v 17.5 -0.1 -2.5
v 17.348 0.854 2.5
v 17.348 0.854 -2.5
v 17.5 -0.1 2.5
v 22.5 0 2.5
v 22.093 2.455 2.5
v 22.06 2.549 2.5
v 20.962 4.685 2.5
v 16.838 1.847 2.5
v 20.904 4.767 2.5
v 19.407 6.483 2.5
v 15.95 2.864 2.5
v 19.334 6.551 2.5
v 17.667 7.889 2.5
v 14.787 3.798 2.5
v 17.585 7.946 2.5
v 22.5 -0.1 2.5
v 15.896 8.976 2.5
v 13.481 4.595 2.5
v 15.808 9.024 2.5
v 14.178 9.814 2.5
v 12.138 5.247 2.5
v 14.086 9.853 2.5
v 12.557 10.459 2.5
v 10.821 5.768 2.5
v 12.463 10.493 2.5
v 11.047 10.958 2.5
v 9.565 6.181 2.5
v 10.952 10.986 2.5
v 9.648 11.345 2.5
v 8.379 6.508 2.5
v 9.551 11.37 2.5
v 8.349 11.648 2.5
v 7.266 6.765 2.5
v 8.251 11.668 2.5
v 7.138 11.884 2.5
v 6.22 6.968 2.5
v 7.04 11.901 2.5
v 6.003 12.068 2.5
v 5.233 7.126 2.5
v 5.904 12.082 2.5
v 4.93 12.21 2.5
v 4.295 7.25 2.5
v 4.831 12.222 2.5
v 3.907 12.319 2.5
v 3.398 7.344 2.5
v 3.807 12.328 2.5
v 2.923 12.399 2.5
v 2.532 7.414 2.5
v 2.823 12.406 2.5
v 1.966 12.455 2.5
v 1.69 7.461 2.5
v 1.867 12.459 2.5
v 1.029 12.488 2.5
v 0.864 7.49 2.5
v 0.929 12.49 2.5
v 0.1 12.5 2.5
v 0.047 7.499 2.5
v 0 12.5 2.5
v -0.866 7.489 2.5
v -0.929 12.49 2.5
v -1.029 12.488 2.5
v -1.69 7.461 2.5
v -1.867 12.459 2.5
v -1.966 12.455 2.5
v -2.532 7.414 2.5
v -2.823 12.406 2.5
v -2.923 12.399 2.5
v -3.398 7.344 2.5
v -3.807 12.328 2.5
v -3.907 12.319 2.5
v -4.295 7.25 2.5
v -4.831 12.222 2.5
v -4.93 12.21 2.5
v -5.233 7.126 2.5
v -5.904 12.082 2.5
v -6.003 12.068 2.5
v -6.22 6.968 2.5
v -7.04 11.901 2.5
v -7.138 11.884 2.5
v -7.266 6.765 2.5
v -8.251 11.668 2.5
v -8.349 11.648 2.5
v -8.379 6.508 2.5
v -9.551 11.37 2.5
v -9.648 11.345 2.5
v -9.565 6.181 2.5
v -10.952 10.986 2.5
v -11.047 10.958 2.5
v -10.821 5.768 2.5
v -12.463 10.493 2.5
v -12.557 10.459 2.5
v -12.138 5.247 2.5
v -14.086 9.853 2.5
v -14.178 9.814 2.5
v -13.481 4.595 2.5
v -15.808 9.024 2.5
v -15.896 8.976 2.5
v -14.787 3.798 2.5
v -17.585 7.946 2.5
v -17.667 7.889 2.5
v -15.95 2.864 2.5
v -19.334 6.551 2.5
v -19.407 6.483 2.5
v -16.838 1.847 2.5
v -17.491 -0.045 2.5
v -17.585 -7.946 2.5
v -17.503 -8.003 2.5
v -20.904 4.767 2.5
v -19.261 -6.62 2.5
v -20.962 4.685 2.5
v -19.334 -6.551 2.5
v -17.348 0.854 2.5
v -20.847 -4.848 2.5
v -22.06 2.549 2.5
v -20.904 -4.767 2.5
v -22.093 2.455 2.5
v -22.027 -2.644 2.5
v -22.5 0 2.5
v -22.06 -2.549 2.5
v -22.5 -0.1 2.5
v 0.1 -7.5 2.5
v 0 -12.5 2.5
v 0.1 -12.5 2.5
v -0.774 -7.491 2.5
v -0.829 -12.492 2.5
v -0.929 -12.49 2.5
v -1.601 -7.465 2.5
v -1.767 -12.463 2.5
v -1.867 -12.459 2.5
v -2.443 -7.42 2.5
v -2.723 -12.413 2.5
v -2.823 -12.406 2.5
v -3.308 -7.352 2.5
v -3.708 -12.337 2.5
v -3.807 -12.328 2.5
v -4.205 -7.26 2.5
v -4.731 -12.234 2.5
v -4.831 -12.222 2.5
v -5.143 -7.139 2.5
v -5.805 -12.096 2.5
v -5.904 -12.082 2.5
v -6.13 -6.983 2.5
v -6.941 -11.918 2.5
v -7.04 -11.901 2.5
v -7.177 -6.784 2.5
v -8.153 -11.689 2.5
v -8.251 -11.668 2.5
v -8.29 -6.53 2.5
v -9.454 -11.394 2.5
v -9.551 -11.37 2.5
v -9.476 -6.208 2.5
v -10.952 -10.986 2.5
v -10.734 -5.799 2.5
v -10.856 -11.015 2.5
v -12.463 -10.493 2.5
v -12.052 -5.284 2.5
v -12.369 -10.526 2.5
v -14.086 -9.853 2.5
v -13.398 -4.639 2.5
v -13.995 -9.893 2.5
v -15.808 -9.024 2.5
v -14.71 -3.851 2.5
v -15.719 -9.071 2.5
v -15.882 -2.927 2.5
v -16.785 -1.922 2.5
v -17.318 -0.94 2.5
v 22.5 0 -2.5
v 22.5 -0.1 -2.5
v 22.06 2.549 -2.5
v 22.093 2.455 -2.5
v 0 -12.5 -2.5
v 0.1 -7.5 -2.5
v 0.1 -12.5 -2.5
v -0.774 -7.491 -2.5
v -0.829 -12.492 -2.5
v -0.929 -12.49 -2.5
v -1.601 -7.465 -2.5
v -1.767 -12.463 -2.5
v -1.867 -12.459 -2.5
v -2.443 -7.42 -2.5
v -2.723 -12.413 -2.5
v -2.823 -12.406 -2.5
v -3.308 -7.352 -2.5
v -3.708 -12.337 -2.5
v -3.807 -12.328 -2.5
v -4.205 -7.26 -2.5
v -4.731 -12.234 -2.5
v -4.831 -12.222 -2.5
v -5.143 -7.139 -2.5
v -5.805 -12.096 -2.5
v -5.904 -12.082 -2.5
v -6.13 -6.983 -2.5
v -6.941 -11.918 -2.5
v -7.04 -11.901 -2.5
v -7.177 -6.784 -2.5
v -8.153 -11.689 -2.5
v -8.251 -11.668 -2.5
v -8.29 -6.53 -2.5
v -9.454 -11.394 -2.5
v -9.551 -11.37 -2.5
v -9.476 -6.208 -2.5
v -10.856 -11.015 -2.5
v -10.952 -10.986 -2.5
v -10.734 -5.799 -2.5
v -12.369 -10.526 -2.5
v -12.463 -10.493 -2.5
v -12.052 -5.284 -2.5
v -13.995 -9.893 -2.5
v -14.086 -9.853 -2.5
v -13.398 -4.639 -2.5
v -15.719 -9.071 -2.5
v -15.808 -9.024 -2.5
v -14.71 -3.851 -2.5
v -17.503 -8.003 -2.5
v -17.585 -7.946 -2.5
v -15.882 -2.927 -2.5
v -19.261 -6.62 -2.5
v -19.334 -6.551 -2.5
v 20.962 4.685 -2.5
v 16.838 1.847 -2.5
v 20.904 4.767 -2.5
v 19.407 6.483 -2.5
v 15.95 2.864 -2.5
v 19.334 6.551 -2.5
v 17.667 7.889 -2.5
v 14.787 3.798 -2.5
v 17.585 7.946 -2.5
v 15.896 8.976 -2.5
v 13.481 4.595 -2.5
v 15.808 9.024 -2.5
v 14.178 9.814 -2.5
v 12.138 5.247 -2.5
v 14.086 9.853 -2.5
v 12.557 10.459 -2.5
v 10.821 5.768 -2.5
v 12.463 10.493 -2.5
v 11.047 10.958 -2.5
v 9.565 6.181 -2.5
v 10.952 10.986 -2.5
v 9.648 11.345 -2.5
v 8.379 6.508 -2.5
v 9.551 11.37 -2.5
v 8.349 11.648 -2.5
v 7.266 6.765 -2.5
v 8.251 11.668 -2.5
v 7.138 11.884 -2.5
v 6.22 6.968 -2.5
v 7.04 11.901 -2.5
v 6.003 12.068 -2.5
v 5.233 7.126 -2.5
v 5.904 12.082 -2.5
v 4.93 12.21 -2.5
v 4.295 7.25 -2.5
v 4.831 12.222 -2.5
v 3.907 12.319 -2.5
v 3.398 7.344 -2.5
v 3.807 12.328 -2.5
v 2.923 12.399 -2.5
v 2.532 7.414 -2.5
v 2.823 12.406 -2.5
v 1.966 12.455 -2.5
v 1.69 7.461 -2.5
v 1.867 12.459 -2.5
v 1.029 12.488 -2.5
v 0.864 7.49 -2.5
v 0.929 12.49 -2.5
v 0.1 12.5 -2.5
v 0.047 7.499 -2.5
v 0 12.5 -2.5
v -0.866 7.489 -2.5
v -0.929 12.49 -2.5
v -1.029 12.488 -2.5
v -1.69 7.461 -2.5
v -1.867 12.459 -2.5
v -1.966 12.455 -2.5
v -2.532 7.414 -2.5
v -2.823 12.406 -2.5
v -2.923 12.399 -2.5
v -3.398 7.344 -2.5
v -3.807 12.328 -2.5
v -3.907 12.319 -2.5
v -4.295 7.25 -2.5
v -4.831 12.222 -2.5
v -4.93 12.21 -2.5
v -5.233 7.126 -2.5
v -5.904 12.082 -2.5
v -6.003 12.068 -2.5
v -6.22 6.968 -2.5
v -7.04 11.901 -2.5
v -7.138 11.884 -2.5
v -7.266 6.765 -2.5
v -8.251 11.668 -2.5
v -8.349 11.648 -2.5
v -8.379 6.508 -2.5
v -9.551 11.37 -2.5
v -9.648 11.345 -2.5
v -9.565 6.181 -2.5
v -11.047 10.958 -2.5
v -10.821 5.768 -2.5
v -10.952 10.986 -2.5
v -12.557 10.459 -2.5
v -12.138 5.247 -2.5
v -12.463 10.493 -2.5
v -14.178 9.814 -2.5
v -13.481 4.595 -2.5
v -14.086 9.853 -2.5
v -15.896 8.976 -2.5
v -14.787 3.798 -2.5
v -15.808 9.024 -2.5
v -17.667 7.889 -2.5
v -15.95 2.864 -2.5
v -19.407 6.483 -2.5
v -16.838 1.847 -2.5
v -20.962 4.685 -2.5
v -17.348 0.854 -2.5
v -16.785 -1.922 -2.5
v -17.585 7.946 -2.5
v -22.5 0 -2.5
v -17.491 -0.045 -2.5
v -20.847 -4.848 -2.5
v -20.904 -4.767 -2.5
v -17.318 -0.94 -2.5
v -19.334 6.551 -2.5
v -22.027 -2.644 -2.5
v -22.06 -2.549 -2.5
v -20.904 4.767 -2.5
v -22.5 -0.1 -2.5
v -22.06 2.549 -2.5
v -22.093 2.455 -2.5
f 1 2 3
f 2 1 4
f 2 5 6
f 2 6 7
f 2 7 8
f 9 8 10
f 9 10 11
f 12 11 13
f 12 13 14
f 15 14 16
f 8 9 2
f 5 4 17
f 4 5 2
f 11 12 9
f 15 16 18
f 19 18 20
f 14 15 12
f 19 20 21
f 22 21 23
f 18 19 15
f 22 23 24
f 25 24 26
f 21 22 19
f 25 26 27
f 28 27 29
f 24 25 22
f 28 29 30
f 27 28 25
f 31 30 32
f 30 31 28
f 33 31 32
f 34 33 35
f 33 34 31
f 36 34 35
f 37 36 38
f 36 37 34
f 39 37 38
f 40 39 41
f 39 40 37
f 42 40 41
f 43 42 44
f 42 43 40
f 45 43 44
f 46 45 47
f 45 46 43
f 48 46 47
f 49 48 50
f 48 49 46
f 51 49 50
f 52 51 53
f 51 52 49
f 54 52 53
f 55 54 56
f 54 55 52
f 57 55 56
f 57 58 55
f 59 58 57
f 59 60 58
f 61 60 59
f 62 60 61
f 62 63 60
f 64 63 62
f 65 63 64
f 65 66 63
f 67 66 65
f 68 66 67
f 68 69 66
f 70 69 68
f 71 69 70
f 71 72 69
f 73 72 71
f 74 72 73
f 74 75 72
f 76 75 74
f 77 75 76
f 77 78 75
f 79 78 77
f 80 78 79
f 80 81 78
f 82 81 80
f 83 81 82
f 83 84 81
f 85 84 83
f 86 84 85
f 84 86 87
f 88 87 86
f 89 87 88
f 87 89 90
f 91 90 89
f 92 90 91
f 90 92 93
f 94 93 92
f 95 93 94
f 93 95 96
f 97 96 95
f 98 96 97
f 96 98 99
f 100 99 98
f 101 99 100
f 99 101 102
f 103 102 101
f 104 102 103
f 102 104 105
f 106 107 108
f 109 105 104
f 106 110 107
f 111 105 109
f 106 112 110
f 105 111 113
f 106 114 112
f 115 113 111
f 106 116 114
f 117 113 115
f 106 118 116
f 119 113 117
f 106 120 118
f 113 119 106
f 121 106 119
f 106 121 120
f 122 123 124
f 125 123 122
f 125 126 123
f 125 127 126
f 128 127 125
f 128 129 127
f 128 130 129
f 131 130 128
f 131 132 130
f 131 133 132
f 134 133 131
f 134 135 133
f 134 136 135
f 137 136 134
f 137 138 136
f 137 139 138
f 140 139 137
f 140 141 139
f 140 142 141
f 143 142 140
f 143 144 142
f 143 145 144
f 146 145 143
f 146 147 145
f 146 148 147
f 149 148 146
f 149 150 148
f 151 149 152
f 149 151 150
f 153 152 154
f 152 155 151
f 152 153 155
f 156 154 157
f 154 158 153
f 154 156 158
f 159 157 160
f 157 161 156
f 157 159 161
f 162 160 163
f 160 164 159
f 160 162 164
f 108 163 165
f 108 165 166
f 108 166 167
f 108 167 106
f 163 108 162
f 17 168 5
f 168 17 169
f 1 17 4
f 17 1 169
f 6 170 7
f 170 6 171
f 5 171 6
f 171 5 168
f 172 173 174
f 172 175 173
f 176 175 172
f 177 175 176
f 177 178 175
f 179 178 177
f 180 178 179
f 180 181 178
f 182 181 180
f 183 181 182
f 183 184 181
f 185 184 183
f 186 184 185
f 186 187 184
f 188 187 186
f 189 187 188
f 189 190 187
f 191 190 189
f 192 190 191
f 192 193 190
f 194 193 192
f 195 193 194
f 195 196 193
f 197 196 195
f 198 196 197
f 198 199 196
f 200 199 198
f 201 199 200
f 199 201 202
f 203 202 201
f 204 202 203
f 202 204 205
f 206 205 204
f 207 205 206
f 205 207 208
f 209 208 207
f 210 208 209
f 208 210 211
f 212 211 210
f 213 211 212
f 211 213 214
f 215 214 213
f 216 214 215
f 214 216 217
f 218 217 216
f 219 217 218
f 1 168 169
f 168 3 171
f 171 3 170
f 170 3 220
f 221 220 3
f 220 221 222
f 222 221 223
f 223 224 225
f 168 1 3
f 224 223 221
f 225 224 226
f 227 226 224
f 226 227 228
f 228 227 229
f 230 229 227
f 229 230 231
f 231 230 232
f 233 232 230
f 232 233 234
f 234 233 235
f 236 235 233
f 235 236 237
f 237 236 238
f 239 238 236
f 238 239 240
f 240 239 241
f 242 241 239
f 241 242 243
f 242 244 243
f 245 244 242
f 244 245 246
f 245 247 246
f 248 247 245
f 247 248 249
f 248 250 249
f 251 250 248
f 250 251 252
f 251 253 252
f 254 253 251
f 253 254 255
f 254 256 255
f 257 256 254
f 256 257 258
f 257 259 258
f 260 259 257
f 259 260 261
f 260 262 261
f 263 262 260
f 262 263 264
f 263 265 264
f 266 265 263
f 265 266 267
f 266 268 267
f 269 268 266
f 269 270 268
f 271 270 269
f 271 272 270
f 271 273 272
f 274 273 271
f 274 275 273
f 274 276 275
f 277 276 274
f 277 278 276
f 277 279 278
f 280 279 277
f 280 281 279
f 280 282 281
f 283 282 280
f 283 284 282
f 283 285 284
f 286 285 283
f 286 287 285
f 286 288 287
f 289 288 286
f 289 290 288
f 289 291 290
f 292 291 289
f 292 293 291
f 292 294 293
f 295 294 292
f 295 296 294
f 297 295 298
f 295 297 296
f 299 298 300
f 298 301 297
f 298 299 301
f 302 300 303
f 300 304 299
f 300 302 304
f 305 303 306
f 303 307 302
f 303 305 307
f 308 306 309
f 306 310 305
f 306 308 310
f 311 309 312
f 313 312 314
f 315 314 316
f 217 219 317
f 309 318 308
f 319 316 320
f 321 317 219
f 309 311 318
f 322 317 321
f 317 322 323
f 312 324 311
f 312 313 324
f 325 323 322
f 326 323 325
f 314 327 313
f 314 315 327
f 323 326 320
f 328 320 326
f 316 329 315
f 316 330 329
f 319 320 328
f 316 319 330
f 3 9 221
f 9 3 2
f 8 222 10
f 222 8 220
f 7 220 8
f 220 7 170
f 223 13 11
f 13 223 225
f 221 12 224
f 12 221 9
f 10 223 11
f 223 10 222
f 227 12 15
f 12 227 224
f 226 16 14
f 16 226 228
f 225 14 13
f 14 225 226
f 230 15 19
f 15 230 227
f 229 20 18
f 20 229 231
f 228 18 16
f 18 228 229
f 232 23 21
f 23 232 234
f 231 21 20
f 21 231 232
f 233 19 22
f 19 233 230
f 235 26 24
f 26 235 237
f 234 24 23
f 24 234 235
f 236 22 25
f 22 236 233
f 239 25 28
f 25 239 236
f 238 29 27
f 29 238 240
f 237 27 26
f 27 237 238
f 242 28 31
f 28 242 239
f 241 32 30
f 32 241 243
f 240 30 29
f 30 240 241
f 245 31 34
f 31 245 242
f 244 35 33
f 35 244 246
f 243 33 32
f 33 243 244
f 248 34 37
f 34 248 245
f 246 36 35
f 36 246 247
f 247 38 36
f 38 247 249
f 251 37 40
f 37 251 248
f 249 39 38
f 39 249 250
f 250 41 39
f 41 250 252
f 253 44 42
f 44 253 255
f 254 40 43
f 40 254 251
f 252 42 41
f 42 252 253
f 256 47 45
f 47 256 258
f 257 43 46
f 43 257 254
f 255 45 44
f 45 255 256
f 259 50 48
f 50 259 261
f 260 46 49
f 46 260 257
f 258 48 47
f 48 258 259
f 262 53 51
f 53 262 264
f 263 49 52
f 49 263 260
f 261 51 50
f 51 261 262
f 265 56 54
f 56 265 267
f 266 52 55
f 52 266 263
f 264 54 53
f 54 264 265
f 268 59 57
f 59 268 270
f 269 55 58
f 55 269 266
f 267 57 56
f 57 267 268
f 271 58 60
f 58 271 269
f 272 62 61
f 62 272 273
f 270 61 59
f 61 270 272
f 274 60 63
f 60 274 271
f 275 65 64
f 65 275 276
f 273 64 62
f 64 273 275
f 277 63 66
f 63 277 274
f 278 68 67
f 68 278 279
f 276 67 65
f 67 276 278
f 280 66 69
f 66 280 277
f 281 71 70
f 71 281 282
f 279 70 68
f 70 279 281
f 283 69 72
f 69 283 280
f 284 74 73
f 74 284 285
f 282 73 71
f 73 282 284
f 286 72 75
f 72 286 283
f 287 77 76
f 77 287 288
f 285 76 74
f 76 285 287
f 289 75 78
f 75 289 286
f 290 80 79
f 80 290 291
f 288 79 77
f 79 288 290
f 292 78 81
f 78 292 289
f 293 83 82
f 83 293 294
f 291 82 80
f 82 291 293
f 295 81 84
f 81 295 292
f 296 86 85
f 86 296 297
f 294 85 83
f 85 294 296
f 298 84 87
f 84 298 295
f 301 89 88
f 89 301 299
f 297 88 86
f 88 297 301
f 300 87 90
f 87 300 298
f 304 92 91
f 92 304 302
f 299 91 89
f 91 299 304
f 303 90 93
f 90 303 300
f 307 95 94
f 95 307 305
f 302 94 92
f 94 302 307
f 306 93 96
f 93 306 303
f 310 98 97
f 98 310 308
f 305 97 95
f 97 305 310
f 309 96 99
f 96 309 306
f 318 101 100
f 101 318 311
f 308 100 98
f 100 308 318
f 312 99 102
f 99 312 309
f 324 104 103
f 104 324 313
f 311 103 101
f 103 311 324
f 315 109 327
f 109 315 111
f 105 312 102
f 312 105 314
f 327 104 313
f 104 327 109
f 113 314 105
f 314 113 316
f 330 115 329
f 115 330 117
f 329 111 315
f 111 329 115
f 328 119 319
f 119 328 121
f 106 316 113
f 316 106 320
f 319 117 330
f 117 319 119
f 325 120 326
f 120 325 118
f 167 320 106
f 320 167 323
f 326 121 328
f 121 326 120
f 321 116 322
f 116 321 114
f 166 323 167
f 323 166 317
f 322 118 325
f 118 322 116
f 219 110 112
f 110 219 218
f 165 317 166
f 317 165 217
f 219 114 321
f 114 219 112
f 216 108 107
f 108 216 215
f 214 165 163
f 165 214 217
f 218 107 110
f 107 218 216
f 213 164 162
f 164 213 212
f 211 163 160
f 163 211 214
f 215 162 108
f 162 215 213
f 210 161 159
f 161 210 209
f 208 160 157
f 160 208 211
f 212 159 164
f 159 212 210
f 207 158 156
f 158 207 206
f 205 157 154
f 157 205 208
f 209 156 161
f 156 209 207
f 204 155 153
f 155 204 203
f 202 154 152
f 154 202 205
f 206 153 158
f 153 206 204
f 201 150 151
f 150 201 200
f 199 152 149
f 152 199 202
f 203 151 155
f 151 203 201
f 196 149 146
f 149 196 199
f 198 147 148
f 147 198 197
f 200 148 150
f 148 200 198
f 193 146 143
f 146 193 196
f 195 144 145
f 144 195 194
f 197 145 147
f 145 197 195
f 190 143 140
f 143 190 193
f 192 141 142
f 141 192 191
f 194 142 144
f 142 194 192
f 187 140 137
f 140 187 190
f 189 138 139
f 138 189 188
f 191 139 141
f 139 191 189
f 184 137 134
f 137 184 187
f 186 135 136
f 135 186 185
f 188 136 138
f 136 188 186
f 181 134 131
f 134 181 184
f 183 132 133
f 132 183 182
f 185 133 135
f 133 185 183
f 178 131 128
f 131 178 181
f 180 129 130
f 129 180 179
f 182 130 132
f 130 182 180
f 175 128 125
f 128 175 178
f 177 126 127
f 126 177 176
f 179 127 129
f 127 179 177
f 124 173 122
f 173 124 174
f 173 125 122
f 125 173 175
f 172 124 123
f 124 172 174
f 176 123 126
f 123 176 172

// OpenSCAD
/*
 *
 *  The form to be extruded needs to be centered!
 *
 */
module elliptic_extrude(a, b, angle = 360, step = 1) {
    f = a ^ 2 / b ^ 2;
    function r(phi) = sqrt(a ^ 2 * b ^ 2 / (b ^ 2 * cos(phi) ^ 2 + a ^ 2 * sin(phi) ^ 2));
    function k(x, y) = a ^ 2 / b ^ 2 * y / x;
    function x(phi) = r(phi) * cos(phi);
    function y(phi) = r(phi) * sin(phi);
    function alpha(k) = atan(k);
    rotate([90,0,0]){
    for (phi = [0:step:angle - step]) {
        hull() {
            rotate([ 0, phi, 0 ]) translate([ r(phi), 0, 0 ]) rotate([ 0, alpha(k(x(phi), y(phi))) - phi, 0 ]) linear_extrude(.1) children(0);
            rotate([ 0, phi + step, 0 ]) translate([ r(phi + step), 0, 0 ]) rotate([ 0, alpha(k(x(phi + step), y(phi + step))) - phi - step, 0 ])
                linear_extrude(.1) children(0);
        }
    }
    }
}

elliptic_extrude(20, 10, 270, 5) square(5, center = true);
